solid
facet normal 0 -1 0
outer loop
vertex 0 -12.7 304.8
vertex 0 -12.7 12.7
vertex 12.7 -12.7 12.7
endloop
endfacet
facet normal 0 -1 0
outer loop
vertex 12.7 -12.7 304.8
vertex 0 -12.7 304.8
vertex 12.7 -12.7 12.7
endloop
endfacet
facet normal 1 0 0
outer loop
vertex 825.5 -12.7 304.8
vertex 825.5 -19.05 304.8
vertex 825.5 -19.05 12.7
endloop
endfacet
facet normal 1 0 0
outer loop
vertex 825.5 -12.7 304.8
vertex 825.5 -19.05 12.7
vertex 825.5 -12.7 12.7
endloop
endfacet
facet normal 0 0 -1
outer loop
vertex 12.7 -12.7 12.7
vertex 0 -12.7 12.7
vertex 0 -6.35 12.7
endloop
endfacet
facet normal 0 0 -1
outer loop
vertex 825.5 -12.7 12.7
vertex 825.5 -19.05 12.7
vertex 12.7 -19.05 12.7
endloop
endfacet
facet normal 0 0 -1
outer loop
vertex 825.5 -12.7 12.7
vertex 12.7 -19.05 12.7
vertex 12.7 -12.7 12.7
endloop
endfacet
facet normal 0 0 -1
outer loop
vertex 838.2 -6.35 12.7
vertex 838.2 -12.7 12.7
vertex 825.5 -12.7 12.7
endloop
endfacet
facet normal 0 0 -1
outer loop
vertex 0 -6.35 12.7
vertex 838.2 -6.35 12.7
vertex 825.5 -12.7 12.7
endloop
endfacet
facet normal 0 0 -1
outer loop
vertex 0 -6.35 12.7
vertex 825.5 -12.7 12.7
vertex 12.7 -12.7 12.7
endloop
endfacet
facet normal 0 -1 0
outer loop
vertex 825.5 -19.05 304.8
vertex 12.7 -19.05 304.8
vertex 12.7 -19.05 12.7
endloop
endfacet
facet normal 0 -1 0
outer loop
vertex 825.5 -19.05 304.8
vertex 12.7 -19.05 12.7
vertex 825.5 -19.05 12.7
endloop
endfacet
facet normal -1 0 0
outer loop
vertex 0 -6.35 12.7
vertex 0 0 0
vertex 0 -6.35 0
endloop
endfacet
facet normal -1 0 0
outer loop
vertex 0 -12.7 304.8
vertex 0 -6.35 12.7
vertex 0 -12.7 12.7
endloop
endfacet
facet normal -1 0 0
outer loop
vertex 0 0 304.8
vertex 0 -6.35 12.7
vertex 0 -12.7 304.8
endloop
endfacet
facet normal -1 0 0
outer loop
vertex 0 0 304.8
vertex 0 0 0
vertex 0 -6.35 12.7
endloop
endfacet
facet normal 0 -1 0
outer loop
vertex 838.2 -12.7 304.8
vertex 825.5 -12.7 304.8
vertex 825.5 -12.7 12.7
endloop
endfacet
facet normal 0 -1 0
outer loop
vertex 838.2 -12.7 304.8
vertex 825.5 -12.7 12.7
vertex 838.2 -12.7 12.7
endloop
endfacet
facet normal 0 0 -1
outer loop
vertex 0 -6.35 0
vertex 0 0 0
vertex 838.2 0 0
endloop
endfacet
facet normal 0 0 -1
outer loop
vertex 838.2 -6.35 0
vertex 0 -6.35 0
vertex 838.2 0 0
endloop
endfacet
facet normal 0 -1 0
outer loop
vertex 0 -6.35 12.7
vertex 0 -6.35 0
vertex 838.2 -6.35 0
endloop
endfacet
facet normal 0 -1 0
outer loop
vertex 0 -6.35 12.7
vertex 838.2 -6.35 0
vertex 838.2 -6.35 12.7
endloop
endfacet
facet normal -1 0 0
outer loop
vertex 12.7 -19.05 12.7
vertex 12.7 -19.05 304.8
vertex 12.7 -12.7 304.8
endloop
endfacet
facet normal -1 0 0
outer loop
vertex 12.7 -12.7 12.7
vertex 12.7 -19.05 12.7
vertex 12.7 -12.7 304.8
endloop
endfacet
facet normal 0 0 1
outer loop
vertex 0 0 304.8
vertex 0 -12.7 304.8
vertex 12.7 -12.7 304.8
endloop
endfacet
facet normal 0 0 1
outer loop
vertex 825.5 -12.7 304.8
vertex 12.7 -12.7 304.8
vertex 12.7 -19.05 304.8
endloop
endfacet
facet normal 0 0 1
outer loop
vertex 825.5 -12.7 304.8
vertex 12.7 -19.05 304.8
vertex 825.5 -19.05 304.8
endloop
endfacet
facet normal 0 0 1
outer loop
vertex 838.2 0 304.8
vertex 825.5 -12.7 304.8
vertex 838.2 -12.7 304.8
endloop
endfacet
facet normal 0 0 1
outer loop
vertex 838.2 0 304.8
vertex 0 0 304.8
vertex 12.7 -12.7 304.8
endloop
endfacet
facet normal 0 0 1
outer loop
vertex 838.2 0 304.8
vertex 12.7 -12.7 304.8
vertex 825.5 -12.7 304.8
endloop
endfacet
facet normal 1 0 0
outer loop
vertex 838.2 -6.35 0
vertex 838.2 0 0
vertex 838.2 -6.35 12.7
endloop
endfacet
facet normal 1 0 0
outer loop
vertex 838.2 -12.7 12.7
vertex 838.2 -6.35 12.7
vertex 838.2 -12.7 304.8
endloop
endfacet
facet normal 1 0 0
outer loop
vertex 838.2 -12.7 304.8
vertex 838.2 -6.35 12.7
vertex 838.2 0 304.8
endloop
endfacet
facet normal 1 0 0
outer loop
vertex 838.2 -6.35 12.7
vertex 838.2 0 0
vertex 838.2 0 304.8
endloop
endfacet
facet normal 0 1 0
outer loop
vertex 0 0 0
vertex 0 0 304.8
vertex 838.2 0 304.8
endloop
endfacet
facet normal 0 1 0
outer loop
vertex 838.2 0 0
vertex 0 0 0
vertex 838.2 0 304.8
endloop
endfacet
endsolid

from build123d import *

# Parameters (mm, degrees)
F0_W     = 838.2
F0_H     = 304.8
F1_DEPTH = 19.05
F2_W     = 12.7
F2_H     = 12.7
F3_DEPTH = 838.201
F4_W     = 12.7
F4_H     = 6.35
F5_DEPTH = 304.801


with BuildPart() as f1:
    # F0 (on Front) → F1 (new body)
    with BuildSketch(Plane.XZ):
        with Locations((419.1, 152.4)):
            Rectangle(F0_W, F0_H)
    extrude(amount=F1_DEPTH)

    # F2 (on face) → F3 (cut, through all)
    with BuildSketch(Plane.YZ.offset(838.2)):
        with Locations((-12.7, 6.35)):
            Rectangle(F2_W, F2_H)
    extrude(amount=-F3_DEPTH, mode=Mode.SUBTRACT)

    # F4 (on face) → F5 (cut, through all)
    with BuildSketch(Plane.XY.offset(304.8)):
        with Locations((831.85, -15.875)):
            Rectangle(F4_W, F4_H)
        with Locations((6.35, -15.875)):
            Rectangle(F4_W, F4_H)
    extrude(amount=-F5_DEPTH, mode=Mode.SUBTRACT)


solid = f1.part
